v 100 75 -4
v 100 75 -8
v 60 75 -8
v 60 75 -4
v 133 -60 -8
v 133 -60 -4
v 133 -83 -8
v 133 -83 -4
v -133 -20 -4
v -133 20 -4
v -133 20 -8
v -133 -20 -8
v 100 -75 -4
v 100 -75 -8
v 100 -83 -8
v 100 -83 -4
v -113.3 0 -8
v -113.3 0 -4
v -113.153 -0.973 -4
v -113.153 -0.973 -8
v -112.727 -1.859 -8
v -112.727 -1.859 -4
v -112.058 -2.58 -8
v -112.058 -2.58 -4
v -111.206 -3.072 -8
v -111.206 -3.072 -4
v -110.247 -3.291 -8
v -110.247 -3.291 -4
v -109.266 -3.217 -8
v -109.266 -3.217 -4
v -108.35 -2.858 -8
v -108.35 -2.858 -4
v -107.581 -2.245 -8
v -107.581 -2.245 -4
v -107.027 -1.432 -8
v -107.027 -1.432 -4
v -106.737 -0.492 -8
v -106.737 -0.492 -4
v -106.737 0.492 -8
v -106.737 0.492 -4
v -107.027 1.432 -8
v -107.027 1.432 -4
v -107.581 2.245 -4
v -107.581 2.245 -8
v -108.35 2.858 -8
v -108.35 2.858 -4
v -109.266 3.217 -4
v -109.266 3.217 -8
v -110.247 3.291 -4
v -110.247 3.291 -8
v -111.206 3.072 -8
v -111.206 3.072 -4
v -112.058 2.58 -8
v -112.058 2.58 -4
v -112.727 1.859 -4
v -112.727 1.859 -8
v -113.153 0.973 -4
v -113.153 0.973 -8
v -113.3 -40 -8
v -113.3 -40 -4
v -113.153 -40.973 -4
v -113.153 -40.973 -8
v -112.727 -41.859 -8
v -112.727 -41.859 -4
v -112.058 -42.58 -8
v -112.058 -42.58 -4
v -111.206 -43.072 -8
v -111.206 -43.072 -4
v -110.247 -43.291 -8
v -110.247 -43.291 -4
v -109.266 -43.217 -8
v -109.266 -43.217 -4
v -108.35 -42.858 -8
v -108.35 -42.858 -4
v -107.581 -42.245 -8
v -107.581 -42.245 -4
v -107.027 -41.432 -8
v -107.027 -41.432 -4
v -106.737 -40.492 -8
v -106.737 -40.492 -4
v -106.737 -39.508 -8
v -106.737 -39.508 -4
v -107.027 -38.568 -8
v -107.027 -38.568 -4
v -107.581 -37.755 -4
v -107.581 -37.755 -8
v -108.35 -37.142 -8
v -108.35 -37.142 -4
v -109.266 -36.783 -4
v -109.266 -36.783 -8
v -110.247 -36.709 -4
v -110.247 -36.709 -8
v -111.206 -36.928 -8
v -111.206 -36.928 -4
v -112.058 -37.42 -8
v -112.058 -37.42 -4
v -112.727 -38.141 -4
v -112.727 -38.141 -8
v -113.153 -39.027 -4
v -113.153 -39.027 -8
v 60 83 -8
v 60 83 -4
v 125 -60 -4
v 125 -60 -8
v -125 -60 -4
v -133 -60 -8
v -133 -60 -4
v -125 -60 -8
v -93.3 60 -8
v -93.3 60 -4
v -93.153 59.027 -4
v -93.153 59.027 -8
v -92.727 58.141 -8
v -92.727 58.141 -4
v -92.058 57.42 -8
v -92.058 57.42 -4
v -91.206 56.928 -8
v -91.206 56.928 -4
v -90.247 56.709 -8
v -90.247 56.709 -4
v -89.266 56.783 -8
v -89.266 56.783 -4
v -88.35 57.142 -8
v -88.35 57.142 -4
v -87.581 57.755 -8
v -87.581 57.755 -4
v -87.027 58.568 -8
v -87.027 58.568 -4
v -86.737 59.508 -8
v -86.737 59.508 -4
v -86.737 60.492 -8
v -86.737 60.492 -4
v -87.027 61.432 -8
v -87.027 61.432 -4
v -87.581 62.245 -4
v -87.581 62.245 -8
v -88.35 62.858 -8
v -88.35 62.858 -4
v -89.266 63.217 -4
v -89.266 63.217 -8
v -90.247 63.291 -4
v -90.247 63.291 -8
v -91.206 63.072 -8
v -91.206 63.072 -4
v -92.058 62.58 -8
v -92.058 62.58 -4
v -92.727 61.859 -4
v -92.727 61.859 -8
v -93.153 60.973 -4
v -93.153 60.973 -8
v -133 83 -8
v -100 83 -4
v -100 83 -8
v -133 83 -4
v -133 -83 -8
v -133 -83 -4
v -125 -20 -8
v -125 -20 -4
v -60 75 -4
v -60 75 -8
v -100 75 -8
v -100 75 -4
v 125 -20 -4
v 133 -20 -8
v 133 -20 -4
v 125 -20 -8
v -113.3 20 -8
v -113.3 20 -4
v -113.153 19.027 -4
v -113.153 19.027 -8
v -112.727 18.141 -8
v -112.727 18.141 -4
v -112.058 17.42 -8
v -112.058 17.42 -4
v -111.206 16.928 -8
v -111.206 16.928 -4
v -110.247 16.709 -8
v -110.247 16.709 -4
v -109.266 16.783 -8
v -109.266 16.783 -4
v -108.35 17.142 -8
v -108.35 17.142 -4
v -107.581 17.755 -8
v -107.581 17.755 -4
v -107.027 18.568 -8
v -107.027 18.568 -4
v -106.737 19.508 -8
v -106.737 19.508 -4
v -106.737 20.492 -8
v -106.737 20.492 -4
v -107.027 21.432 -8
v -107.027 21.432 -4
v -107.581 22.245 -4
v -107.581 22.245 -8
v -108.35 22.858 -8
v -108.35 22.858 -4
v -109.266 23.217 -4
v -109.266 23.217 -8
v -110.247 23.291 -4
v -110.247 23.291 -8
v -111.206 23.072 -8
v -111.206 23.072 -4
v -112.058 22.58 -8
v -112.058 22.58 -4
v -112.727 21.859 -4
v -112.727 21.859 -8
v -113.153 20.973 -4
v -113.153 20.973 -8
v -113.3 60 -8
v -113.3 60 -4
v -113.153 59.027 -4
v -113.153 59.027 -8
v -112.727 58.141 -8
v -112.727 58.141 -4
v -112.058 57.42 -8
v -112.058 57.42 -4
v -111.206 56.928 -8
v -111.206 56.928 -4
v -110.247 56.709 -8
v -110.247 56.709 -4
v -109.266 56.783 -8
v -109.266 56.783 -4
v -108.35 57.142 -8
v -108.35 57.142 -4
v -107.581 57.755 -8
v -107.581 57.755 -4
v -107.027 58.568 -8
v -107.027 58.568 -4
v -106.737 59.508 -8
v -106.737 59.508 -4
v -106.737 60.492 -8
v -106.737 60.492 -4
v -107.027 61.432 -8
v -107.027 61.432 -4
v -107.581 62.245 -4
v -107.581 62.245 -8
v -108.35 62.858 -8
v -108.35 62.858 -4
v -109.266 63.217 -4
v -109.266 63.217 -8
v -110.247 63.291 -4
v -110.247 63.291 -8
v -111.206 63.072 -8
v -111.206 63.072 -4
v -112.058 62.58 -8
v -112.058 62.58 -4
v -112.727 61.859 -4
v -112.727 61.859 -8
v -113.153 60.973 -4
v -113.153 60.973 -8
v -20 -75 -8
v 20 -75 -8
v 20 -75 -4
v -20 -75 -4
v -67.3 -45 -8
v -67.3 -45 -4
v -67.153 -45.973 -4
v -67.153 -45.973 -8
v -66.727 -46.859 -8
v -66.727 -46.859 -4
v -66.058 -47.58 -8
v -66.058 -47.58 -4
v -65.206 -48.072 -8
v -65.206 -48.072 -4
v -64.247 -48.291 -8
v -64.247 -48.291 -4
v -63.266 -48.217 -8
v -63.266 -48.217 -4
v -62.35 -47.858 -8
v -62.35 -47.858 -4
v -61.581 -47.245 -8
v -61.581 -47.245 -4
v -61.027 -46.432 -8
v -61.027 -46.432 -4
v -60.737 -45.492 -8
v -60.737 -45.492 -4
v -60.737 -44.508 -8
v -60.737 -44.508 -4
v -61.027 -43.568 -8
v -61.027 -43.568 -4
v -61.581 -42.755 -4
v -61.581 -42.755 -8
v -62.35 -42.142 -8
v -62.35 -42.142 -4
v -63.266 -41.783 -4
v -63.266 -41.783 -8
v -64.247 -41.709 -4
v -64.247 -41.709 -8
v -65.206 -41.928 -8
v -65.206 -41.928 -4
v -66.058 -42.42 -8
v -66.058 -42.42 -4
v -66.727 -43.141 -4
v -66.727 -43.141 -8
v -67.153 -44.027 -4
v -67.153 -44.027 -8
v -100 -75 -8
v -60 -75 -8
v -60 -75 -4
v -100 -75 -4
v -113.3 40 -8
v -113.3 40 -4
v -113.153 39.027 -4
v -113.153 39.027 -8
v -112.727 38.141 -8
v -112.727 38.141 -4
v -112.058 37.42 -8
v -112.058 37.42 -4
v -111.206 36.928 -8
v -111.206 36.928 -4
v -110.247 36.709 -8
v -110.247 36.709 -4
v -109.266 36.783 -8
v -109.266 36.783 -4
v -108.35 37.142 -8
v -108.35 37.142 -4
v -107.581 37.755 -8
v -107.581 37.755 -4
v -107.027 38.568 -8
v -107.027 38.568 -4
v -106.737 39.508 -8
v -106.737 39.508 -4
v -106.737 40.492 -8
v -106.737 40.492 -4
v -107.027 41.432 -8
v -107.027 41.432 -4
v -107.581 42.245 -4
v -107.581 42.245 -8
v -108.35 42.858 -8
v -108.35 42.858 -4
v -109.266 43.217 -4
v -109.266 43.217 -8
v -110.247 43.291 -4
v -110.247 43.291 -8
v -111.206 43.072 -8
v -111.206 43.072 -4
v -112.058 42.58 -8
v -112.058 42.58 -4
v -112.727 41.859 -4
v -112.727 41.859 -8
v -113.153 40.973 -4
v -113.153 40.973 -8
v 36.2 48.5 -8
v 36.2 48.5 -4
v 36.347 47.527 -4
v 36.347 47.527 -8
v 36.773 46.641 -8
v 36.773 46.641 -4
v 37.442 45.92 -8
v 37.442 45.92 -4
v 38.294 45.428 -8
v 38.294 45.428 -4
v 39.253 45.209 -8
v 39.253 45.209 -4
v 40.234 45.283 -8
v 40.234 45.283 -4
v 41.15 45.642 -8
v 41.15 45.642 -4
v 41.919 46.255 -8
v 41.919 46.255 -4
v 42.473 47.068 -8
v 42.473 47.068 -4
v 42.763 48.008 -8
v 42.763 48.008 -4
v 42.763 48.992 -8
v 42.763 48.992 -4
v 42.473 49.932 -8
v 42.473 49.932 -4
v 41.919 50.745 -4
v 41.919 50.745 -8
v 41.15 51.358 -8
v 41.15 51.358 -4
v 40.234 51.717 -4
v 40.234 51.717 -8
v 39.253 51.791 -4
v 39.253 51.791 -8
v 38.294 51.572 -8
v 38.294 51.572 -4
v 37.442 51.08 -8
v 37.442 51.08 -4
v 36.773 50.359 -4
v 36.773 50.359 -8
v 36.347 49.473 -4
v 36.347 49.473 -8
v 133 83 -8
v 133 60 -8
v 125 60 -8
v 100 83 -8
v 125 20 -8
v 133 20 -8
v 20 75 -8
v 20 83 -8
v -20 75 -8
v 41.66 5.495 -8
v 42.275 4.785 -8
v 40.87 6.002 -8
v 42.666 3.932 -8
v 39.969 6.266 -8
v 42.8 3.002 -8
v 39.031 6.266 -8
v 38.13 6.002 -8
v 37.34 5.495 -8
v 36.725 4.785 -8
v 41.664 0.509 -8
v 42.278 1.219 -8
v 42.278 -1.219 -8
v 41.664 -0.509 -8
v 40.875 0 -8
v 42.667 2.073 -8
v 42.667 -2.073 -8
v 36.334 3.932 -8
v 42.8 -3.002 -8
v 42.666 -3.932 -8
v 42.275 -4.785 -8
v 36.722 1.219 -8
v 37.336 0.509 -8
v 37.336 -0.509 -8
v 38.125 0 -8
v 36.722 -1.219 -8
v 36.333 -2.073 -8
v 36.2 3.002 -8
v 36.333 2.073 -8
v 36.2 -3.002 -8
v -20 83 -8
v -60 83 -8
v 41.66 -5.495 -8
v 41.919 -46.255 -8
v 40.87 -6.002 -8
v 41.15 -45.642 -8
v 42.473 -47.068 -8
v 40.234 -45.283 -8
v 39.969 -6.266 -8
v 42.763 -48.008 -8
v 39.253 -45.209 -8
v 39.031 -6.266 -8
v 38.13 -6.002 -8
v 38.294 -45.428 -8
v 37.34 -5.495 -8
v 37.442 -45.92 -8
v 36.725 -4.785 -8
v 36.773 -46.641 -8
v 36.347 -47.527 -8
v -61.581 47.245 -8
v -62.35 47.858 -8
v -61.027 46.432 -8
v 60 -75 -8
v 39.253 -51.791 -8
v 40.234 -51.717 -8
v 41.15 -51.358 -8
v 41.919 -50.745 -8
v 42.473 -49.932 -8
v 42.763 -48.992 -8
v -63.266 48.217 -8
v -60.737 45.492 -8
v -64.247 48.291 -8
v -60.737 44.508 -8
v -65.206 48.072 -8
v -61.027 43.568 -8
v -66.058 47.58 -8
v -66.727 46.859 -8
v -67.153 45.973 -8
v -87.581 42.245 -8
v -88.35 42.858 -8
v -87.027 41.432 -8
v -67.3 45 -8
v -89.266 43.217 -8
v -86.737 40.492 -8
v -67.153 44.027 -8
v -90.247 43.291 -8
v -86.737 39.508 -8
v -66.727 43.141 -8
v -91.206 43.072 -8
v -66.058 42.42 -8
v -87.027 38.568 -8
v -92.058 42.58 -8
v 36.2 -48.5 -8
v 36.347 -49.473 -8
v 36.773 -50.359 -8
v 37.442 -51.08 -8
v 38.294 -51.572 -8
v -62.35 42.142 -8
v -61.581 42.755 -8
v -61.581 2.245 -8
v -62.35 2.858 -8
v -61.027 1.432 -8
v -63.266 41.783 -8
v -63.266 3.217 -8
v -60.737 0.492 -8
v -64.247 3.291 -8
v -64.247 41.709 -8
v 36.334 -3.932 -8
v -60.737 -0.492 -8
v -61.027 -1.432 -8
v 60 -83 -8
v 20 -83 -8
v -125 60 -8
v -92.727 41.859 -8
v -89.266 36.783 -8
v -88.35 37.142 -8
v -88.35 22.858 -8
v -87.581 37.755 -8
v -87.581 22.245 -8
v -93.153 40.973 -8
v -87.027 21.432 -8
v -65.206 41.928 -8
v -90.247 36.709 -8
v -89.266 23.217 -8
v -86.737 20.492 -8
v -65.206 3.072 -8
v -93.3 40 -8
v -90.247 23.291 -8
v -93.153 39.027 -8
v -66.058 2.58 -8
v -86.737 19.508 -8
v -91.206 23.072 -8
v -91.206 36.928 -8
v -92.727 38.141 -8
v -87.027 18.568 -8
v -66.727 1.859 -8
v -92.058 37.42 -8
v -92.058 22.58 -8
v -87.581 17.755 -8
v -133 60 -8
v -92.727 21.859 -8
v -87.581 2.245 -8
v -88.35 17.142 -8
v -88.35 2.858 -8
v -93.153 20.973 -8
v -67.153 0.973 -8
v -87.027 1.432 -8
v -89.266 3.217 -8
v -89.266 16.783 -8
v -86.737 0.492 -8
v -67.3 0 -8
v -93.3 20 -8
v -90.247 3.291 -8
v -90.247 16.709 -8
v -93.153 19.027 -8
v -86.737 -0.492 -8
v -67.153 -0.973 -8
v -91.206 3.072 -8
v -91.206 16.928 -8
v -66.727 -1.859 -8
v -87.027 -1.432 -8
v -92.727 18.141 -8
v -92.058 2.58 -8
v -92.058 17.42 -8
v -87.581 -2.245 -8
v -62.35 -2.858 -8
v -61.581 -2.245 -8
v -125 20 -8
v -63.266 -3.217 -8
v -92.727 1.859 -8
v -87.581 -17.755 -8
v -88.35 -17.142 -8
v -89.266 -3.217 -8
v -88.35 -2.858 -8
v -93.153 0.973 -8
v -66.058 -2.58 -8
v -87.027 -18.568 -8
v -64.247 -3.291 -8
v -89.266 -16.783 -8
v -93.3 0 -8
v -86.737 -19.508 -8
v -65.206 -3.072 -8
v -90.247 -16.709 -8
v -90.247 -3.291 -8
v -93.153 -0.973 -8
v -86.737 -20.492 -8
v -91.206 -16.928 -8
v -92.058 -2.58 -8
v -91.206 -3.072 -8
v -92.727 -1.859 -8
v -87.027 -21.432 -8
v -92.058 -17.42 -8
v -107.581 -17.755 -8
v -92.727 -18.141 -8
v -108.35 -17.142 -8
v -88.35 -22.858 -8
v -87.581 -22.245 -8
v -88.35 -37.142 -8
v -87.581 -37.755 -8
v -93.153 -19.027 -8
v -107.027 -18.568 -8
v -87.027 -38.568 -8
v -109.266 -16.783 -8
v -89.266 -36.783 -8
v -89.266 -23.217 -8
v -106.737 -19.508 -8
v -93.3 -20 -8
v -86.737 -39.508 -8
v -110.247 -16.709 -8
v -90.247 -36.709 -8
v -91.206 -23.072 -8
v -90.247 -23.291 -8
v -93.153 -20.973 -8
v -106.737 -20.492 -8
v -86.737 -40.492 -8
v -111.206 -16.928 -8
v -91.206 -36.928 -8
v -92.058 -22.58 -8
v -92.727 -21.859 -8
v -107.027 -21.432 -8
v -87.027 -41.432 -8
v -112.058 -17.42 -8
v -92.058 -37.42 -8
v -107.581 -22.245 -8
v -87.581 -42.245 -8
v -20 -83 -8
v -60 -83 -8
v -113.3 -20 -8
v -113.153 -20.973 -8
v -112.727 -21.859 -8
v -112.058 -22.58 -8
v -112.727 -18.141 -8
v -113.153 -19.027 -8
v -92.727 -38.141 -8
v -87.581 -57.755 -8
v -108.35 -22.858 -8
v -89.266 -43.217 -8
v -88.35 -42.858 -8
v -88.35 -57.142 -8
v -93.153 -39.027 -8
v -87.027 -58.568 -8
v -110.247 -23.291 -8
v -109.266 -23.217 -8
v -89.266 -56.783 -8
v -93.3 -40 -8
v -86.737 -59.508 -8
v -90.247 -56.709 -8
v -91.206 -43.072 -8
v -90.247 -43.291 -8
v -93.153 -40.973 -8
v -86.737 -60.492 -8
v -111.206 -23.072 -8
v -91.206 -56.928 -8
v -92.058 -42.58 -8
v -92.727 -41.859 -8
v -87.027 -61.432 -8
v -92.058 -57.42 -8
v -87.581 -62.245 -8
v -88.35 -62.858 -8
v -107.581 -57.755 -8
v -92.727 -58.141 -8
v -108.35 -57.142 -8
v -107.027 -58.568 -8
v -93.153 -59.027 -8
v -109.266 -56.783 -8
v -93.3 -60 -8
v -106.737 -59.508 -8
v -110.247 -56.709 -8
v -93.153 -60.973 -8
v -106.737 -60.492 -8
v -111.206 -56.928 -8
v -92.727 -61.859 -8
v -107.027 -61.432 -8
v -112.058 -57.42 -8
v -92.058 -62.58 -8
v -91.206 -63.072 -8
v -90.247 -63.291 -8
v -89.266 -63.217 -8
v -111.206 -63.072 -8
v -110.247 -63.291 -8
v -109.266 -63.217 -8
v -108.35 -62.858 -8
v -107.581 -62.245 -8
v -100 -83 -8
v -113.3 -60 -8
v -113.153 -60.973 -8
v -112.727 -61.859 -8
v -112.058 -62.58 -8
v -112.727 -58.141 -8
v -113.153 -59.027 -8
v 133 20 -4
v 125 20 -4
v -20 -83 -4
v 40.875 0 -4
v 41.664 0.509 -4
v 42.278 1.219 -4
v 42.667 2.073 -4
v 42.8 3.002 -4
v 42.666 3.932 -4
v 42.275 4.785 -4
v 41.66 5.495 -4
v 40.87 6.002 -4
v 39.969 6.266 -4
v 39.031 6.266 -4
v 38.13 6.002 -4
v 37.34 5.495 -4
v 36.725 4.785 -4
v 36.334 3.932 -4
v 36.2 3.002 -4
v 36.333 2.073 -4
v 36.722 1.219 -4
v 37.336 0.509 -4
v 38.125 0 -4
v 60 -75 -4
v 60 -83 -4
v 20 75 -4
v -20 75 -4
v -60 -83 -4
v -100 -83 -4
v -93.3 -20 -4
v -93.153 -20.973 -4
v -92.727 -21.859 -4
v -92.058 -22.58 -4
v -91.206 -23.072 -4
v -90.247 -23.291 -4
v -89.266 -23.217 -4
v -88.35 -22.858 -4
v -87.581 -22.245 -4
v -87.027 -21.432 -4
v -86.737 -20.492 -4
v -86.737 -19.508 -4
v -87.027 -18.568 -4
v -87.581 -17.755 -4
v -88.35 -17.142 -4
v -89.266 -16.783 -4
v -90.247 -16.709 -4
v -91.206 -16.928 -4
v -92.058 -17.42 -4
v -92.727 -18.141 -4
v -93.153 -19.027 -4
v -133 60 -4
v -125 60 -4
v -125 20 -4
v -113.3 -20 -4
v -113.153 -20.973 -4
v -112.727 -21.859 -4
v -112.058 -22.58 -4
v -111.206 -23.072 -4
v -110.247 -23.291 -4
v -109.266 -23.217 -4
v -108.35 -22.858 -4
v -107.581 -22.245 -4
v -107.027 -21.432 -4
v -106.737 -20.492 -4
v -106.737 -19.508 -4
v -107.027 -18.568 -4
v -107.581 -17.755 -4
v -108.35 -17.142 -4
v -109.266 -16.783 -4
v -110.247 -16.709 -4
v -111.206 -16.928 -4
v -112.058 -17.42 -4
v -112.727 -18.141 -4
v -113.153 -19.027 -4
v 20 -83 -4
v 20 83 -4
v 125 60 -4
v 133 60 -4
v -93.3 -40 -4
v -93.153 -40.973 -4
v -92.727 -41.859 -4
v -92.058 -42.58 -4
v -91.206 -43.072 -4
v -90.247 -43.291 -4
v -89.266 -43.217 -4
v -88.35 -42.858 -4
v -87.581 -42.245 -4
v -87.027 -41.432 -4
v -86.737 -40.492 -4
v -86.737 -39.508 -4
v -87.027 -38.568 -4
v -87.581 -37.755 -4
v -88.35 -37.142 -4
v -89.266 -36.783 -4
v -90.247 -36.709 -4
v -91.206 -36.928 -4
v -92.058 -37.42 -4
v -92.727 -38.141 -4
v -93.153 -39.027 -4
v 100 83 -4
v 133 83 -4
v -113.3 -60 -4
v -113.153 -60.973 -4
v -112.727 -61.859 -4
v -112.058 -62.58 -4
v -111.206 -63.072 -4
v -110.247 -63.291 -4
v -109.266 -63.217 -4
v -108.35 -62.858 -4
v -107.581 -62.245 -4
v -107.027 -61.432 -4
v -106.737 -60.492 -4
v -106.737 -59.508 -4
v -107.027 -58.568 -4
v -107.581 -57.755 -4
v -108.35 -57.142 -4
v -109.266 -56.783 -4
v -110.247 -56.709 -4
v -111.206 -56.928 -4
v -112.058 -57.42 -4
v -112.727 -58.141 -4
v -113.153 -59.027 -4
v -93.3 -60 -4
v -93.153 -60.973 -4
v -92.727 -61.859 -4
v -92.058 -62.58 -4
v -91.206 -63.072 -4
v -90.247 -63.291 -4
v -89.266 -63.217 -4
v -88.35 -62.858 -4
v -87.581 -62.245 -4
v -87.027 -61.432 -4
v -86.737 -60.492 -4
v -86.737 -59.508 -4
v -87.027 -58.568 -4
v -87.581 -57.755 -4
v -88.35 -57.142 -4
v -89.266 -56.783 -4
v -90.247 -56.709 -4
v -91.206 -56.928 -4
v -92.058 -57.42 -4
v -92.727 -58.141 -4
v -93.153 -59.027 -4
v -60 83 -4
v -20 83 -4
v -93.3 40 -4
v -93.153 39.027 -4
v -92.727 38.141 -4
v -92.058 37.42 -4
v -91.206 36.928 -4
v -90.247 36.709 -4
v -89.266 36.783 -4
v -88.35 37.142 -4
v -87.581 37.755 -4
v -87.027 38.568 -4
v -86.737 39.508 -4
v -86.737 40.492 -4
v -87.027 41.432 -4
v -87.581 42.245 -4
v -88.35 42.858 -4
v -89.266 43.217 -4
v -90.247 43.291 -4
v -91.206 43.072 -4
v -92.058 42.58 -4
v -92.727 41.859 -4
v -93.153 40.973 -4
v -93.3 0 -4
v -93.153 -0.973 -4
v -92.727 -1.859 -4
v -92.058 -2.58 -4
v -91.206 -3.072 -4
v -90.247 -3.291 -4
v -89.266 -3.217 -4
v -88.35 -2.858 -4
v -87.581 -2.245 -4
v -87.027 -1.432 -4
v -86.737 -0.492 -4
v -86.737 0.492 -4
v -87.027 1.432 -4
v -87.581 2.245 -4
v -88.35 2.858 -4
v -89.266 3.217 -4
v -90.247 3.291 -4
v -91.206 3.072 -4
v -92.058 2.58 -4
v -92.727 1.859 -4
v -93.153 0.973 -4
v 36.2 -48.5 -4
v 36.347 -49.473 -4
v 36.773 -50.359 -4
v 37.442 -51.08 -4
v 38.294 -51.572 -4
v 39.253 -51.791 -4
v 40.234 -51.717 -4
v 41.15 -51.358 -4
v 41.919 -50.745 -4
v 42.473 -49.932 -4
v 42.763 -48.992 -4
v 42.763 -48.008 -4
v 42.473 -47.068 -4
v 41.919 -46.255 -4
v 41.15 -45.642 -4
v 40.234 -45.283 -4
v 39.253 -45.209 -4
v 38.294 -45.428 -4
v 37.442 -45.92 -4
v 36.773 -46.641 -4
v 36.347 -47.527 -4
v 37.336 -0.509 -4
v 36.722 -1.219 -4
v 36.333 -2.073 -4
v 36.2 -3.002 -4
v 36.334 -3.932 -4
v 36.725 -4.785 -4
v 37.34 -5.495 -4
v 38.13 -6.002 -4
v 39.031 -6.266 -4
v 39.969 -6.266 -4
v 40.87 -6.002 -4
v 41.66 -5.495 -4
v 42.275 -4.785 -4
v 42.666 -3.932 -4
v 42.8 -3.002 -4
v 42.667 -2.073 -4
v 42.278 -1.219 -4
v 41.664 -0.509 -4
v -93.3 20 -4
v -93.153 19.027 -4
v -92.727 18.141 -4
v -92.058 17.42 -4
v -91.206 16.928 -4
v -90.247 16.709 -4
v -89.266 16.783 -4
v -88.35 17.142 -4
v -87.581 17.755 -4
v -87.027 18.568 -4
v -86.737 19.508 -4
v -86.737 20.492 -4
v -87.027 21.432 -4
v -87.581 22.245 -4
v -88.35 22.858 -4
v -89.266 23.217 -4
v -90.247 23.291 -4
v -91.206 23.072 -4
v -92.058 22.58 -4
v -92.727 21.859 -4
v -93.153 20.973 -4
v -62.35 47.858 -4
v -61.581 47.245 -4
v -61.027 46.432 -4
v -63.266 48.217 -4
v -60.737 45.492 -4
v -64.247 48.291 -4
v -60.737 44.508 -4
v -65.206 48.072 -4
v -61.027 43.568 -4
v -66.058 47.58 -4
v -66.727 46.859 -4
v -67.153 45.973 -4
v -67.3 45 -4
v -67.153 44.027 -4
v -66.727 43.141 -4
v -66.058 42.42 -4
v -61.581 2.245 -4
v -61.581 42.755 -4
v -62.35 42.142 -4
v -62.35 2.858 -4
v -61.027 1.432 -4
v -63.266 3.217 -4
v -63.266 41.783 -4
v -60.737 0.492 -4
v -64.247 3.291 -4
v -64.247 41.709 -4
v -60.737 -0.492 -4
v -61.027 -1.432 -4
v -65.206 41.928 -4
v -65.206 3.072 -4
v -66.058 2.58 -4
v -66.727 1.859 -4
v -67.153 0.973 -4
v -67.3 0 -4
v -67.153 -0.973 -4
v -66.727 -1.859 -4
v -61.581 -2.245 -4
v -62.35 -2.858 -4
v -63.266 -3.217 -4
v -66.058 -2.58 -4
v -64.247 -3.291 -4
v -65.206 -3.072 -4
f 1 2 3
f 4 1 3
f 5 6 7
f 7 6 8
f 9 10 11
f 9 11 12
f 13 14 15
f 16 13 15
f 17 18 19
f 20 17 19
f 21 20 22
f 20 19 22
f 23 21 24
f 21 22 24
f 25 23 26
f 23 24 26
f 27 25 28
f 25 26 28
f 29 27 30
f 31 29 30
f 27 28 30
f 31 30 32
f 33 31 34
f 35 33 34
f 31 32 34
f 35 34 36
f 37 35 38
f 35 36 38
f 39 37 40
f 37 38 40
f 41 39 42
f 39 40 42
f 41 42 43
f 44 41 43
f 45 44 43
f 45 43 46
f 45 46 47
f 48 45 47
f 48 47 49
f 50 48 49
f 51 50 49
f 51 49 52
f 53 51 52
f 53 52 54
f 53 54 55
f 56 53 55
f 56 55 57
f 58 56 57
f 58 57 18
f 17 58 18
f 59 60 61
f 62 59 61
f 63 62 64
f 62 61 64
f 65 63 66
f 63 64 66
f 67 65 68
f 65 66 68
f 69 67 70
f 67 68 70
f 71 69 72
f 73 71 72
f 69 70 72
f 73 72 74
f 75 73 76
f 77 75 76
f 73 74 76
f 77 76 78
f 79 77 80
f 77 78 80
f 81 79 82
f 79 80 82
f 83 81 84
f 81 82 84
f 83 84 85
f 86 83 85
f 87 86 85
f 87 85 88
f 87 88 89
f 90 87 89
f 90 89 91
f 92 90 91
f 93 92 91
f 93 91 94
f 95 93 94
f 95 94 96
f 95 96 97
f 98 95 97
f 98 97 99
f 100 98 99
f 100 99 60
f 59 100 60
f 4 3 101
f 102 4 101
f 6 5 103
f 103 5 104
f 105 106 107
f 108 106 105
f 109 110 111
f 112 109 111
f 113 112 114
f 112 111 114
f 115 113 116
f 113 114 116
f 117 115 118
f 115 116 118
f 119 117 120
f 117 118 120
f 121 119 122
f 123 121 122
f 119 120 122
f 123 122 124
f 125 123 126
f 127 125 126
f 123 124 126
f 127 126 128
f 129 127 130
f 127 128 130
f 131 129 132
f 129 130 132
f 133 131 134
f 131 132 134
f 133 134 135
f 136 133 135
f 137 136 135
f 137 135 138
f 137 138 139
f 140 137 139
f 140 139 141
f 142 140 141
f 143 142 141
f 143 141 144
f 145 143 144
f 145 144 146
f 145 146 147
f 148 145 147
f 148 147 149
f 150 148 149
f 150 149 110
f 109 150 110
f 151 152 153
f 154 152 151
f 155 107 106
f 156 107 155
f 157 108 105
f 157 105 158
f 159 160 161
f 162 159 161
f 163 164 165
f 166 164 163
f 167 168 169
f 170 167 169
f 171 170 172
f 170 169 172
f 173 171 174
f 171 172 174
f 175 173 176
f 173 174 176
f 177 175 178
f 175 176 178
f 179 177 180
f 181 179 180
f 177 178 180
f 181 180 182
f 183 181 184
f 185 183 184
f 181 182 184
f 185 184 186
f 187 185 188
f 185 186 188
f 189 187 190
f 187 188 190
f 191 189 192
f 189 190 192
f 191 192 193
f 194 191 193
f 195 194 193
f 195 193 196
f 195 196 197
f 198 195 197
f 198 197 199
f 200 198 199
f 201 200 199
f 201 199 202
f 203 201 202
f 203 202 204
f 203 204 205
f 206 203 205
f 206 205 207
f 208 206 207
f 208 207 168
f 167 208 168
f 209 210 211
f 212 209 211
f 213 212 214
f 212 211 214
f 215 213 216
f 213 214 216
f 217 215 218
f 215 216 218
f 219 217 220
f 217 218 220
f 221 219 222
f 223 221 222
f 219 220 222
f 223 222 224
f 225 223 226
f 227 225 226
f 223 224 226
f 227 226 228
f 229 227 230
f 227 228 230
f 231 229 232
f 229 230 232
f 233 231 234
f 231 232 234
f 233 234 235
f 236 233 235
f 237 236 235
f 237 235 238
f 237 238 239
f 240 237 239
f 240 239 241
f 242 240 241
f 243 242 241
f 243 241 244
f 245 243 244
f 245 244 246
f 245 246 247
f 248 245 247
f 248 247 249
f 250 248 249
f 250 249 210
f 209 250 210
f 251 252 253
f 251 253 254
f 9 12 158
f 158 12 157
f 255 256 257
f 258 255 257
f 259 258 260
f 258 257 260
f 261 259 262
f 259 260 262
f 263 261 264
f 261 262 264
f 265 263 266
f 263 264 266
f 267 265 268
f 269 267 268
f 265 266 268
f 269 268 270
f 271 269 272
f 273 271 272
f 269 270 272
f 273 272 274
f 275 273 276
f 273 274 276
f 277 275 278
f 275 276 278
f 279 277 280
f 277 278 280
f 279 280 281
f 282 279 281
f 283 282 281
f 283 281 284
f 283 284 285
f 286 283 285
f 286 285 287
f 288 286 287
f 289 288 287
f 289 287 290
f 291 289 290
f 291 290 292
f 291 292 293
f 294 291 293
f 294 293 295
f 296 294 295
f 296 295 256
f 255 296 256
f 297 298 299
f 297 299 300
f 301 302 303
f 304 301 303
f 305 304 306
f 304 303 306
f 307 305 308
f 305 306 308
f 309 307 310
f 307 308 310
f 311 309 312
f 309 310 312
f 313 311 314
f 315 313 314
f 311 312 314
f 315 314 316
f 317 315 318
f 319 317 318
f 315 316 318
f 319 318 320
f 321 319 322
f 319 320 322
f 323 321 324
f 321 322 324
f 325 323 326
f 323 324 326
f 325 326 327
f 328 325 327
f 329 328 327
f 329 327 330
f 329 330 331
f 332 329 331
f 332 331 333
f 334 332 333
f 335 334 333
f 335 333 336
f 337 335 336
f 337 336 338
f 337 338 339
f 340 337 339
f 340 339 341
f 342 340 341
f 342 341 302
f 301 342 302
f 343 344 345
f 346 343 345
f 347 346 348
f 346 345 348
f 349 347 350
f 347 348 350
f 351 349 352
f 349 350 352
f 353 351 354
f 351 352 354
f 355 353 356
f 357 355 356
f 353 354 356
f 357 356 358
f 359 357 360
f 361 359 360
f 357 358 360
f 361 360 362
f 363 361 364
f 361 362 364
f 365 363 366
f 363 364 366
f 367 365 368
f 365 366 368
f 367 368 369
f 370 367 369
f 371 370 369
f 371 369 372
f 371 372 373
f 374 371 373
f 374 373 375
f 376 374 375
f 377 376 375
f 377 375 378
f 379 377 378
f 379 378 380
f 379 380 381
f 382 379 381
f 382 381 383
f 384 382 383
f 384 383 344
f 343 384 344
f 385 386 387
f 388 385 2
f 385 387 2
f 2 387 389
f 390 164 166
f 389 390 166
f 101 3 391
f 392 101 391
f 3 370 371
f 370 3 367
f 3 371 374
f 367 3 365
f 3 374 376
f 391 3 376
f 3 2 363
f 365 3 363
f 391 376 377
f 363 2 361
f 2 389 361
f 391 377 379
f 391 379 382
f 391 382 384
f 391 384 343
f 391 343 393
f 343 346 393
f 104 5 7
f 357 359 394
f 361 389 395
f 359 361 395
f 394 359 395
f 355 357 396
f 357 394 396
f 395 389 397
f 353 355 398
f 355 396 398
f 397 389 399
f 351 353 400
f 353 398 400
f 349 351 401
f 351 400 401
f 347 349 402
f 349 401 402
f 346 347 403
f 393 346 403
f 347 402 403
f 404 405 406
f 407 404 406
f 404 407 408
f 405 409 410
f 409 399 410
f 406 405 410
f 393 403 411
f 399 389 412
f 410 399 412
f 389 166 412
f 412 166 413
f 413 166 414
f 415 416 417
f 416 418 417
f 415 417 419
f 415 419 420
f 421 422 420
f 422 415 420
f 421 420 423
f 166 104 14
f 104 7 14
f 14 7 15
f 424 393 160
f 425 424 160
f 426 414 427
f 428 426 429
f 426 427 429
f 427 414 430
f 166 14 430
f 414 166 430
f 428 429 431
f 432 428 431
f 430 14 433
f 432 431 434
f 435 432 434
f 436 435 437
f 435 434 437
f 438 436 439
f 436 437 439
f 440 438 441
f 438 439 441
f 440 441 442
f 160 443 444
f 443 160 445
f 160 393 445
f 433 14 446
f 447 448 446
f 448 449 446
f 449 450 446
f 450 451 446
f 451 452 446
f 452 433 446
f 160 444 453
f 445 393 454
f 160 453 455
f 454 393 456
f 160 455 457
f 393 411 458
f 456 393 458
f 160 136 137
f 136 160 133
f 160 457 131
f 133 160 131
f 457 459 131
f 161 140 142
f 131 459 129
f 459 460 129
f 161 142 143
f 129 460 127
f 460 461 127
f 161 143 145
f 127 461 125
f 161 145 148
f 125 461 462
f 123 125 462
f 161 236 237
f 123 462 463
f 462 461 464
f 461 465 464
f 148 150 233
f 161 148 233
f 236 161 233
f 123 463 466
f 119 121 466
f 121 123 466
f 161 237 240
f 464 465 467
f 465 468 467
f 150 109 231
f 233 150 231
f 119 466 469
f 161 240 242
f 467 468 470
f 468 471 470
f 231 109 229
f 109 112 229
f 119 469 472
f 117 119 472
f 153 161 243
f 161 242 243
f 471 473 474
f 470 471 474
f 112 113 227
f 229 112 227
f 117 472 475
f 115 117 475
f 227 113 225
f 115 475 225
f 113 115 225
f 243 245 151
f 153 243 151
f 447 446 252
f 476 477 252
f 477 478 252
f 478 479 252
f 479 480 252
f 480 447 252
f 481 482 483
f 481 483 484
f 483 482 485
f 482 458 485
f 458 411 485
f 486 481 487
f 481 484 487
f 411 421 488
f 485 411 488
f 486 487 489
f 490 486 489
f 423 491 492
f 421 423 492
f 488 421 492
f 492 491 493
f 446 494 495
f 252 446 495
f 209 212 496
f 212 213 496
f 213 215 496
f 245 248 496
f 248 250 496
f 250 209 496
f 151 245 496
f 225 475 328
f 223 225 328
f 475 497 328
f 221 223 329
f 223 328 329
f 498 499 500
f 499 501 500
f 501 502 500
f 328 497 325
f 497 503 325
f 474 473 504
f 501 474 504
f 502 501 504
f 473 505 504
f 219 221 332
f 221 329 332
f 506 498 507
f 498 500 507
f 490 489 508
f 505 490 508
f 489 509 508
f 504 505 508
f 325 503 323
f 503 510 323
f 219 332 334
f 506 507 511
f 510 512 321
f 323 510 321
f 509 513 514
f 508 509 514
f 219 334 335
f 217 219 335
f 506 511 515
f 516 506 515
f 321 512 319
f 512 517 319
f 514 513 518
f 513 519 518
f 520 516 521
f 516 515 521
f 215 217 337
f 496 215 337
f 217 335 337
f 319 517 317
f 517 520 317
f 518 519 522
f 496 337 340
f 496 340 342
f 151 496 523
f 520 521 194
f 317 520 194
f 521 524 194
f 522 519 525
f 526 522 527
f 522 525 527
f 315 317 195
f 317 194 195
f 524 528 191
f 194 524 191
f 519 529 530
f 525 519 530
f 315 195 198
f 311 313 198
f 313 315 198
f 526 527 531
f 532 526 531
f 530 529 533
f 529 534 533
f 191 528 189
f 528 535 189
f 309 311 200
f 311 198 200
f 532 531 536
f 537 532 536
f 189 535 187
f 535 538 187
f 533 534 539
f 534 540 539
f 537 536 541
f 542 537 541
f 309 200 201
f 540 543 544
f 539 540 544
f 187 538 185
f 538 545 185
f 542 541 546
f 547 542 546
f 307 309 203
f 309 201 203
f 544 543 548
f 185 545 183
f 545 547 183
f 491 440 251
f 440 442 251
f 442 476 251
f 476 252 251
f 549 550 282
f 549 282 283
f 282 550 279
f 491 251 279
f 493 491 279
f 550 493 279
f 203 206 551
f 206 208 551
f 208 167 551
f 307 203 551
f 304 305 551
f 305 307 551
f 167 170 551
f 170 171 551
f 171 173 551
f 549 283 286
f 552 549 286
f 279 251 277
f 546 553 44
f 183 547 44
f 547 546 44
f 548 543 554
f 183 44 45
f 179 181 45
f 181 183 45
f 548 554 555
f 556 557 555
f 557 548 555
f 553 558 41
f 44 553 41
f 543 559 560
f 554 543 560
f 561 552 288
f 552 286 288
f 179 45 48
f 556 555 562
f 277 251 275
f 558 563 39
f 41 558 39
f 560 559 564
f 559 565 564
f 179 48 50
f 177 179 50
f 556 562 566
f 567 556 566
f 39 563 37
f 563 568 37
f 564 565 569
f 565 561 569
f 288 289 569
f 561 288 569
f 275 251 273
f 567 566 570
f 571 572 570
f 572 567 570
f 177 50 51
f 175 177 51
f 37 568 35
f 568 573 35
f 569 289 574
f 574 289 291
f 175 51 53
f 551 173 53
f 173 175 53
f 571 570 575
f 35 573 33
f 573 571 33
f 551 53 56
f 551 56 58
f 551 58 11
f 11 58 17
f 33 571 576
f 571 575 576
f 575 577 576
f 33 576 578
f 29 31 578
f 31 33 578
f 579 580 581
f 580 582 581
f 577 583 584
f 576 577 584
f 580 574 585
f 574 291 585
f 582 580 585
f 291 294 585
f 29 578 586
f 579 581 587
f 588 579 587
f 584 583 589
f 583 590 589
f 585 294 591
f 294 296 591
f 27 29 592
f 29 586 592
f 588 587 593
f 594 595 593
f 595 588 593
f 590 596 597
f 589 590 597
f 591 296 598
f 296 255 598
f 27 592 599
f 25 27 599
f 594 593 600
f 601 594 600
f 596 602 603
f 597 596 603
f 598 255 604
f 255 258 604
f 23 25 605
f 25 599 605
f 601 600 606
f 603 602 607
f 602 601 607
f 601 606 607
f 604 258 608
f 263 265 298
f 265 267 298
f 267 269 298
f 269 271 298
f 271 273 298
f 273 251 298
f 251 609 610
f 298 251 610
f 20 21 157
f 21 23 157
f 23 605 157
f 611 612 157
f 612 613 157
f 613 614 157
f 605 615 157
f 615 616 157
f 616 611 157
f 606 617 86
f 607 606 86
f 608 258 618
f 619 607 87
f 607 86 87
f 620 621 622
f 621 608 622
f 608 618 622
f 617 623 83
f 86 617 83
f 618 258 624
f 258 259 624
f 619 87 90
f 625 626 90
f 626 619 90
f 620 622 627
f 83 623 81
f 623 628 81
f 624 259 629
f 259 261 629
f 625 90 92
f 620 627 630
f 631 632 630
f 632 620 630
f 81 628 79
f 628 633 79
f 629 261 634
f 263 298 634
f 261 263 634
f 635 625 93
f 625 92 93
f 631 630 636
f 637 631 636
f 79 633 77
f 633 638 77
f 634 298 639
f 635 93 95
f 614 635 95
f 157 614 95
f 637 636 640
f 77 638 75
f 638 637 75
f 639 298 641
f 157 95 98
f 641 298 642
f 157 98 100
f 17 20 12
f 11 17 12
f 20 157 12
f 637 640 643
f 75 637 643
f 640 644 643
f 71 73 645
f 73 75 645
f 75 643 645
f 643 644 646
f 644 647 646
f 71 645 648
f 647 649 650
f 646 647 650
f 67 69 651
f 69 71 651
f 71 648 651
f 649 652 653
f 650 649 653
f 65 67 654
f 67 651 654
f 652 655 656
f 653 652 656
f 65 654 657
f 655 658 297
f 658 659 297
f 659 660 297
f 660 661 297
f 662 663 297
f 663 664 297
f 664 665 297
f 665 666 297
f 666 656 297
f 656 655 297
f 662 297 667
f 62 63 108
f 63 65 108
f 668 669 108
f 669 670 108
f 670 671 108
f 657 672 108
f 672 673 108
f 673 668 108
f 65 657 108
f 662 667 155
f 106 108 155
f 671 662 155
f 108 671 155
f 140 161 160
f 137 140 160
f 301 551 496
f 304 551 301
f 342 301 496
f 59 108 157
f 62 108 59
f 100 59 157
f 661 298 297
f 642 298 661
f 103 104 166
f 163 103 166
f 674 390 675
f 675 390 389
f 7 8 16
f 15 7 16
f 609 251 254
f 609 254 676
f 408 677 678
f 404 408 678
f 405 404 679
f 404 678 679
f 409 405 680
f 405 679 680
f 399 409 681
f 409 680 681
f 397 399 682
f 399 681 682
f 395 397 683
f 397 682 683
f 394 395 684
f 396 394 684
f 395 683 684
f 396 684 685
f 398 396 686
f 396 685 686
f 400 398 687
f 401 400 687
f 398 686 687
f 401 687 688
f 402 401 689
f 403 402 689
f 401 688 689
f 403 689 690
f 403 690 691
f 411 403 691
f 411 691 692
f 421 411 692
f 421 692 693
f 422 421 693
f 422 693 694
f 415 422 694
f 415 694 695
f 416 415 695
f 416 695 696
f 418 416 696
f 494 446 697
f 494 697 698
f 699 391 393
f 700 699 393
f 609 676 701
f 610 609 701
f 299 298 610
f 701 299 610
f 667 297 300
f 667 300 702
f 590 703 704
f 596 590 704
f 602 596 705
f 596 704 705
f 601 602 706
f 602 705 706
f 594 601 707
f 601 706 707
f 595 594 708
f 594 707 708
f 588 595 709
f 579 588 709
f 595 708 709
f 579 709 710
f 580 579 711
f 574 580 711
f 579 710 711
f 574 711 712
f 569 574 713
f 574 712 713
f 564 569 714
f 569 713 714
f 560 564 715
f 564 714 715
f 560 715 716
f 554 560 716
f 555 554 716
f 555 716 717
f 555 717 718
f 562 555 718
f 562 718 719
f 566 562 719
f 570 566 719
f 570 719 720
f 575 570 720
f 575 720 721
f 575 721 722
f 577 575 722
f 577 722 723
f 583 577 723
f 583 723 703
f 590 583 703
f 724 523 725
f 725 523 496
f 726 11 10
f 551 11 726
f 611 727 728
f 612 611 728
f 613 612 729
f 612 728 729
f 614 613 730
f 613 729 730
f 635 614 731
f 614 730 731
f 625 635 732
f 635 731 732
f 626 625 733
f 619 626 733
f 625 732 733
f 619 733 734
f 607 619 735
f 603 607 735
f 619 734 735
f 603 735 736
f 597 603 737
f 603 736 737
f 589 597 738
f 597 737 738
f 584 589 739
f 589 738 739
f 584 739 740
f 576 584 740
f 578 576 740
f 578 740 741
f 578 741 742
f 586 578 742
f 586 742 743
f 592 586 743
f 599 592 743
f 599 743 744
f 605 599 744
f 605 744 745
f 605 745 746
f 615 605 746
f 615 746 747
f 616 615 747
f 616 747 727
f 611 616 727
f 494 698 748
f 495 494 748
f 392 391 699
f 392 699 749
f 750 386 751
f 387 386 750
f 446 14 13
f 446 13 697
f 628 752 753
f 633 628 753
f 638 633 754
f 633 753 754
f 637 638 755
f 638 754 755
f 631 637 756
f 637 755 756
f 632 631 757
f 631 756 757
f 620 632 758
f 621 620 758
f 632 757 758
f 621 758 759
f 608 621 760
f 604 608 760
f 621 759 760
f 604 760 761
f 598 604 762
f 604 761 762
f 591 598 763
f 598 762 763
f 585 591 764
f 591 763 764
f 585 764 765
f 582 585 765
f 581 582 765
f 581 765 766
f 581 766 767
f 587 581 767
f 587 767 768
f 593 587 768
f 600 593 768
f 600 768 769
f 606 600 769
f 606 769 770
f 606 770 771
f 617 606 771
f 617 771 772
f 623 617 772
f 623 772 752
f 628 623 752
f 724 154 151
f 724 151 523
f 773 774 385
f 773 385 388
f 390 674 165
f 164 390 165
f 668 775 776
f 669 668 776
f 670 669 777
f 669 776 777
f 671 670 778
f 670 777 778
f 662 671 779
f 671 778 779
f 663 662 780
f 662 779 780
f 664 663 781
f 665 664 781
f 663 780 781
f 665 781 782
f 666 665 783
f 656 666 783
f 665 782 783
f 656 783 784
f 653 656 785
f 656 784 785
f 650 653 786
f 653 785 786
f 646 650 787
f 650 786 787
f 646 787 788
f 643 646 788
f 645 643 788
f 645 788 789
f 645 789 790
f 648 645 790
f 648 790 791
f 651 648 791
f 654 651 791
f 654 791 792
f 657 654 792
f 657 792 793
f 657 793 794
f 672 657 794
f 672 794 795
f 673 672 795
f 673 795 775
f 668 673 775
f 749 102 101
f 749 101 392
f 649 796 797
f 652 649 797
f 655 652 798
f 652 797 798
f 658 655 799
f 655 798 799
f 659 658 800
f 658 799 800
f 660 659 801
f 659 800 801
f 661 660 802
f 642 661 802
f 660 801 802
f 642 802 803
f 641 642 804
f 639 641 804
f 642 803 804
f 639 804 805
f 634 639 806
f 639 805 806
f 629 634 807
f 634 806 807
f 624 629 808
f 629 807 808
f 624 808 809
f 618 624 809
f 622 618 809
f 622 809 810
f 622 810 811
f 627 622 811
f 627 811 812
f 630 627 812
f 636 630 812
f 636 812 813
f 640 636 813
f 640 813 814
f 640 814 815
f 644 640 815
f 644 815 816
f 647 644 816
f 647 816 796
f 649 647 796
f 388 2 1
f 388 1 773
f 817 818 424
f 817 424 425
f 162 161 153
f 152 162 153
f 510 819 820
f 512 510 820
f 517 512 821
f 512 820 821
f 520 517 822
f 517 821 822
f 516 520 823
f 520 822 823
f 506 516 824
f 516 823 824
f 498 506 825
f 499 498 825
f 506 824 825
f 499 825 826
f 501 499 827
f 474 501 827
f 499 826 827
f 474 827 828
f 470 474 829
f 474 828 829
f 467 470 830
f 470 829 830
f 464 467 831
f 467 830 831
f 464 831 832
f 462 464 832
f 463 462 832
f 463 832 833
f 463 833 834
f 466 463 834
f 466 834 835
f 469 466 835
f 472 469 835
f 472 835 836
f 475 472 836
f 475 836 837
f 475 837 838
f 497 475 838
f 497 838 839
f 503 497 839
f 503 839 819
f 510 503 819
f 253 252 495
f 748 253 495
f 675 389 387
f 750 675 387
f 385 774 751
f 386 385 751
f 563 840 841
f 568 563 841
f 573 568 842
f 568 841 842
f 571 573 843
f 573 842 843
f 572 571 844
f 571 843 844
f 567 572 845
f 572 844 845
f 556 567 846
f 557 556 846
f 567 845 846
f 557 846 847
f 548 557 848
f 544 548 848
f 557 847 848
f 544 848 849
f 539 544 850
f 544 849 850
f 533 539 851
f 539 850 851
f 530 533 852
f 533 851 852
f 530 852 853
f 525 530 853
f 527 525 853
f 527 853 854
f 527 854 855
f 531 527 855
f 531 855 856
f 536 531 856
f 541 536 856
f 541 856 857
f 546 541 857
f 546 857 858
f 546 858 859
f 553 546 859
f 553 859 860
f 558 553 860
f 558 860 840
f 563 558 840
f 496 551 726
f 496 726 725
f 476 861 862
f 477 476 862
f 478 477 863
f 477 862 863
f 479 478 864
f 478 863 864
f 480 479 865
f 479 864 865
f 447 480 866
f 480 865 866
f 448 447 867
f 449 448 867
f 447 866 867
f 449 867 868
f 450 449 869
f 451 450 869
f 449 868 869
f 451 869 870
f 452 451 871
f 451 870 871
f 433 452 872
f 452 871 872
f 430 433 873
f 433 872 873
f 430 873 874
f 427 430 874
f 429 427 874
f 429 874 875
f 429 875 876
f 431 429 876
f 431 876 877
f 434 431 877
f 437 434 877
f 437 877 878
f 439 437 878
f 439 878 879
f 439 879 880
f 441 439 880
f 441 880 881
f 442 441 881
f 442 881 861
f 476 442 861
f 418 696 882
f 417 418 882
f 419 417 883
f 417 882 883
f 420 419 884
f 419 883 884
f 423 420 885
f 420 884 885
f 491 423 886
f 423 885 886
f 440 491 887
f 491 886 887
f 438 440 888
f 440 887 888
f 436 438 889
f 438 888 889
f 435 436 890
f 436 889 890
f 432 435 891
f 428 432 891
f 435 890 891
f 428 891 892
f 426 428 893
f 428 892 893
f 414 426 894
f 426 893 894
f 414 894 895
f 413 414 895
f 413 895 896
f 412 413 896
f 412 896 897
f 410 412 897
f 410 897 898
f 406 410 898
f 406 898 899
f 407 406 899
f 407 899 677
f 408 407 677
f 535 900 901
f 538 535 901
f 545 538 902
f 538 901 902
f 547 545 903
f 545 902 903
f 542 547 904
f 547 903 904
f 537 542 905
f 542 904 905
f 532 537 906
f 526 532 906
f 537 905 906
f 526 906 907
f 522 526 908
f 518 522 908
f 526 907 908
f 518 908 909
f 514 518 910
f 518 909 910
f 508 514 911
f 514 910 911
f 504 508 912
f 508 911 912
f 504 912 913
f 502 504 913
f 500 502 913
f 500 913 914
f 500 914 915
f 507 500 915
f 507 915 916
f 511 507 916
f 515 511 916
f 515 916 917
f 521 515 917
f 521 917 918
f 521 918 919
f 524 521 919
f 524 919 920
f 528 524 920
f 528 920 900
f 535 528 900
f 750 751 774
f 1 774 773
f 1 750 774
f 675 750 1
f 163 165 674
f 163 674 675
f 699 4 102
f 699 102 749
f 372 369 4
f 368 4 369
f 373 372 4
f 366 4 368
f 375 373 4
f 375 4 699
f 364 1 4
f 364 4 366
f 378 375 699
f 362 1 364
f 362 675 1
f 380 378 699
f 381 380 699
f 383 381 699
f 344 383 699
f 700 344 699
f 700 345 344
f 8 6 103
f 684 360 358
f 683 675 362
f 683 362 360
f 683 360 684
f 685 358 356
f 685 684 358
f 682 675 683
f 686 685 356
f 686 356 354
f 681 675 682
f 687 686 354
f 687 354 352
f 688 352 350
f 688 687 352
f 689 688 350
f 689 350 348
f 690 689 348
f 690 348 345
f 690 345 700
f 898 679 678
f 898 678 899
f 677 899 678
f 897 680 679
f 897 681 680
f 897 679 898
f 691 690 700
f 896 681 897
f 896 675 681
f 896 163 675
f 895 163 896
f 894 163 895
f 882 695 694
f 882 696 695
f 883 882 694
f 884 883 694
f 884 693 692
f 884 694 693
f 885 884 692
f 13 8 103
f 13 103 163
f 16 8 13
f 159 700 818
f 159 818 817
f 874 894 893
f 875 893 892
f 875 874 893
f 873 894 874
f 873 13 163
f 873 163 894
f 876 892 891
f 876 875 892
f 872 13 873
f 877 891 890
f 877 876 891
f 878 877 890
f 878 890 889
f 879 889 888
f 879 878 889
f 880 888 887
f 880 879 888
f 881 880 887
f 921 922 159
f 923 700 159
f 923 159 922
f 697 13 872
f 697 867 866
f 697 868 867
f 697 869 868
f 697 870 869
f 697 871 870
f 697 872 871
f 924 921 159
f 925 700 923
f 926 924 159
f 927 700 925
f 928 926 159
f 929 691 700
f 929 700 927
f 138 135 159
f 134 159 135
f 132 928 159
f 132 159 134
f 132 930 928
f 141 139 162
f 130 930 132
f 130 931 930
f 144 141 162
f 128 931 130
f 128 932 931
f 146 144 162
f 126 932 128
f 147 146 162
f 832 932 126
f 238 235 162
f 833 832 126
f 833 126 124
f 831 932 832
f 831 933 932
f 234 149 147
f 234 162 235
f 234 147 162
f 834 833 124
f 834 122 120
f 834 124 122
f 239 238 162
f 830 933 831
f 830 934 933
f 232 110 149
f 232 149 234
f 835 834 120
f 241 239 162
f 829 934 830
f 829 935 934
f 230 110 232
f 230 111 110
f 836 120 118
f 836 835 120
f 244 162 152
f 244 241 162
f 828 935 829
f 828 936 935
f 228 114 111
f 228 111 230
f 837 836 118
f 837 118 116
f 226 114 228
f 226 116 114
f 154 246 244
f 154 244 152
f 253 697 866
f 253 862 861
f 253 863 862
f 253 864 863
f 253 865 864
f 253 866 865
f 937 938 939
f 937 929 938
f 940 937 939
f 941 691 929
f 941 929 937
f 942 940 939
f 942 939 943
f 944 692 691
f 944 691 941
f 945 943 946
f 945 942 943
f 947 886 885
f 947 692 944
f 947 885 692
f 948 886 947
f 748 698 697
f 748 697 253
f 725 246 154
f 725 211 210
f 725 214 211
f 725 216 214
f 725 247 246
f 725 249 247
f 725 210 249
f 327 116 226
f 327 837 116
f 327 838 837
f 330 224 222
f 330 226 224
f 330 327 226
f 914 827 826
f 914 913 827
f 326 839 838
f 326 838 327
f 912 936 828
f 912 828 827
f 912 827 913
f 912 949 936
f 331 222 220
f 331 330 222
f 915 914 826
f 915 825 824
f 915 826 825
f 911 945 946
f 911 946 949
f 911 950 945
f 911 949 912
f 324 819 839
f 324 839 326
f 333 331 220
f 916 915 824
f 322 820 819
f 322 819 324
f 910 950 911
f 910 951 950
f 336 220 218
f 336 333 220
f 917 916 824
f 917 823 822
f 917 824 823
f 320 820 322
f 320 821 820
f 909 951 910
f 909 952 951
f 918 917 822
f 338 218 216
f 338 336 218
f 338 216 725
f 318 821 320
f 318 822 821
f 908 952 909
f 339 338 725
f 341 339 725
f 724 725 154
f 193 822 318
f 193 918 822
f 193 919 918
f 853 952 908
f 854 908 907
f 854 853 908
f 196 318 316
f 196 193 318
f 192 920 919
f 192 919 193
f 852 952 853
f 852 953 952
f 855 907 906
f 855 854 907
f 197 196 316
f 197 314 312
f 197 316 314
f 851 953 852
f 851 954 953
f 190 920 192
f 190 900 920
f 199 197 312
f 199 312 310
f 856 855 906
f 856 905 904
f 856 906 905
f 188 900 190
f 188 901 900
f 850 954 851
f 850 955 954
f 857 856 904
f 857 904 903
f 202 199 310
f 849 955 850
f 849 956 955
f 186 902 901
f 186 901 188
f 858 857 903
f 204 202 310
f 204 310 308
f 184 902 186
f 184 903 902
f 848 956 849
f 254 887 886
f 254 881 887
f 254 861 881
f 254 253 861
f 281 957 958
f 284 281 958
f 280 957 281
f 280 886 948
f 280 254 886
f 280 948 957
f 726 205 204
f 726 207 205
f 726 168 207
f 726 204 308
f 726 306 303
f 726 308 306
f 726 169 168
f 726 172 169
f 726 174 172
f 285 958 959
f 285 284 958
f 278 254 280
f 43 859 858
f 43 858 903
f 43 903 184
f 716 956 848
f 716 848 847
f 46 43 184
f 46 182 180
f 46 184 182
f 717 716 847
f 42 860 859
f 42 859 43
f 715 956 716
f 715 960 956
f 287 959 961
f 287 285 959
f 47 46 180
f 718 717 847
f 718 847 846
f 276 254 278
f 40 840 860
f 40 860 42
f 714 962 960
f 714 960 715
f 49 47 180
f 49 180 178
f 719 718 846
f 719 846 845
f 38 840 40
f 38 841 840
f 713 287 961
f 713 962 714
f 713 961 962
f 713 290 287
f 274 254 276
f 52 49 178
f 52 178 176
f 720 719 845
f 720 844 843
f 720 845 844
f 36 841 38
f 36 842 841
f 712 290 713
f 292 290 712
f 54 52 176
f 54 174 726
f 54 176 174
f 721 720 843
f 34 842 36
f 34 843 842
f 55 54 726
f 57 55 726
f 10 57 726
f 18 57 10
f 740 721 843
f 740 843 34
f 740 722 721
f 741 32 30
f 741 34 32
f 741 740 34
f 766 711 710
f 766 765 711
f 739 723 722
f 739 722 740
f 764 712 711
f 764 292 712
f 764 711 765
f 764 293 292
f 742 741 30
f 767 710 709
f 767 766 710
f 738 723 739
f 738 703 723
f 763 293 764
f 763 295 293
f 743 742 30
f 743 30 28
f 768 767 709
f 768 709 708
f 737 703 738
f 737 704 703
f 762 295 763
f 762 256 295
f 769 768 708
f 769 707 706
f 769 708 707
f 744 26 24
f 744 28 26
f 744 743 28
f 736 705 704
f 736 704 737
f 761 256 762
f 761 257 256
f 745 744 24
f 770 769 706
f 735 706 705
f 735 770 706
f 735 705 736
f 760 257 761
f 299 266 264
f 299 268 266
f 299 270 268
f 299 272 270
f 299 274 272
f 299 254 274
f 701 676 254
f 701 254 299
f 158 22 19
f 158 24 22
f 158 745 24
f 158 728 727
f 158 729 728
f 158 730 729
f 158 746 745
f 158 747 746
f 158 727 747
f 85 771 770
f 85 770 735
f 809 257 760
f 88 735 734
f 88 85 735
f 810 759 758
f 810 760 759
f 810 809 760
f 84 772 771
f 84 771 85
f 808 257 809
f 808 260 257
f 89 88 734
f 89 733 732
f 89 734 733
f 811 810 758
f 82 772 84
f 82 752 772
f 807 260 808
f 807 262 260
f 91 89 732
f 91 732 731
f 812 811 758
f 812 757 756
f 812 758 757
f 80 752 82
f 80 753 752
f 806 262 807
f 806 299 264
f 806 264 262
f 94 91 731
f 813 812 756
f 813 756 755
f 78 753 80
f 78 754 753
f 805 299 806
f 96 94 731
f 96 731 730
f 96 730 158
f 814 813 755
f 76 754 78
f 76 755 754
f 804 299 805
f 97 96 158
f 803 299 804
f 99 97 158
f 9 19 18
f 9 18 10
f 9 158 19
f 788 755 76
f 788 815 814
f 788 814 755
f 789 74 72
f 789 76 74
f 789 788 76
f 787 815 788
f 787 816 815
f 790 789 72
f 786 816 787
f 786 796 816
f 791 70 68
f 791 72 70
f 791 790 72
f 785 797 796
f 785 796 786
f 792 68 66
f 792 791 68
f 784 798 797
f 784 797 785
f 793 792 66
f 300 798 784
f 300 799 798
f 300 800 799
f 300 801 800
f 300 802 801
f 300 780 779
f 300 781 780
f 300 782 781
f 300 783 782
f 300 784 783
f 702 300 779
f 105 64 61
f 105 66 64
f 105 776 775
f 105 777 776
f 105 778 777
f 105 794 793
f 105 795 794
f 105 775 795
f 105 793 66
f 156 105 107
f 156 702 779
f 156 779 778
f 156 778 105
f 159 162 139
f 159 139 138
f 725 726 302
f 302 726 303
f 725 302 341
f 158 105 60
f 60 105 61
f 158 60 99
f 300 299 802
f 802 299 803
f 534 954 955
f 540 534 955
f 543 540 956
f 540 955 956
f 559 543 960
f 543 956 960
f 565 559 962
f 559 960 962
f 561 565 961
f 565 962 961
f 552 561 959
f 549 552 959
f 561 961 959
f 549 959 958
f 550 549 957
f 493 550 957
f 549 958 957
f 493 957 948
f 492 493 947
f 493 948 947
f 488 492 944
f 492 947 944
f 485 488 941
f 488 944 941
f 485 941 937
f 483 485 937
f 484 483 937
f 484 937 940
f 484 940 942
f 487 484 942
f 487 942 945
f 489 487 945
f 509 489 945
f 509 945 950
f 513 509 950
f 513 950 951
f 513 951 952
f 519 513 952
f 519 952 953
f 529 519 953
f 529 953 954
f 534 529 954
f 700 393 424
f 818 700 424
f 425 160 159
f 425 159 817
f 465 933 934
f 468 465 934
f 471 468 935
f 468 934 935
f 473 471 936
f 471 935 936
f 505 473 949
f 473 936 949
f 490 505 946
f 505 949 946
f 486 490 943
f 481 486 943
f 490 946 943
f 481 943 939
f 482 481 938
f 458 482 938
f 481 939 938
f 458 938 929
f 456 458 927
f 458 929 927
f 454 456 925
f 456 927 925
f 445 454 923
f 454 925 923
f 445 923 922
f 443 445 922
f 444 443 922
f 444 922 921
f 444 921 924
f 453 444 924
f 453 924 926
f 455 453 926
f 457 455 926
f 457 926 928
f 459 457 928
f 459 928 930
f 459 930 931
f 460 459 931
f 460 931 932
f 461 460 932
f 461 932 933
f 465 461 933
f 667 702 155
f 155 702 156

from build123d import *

# Parameters (mm, degrees)
SKETCH002_W   = 266
SKETCH002_H   = 166
PAD001_DEPTH  = 4
SKETCH015_W   = 40
SKETCH015_H   = 30
SKETCH015_W_2 = 30
SKETCH015_H_2 = 40
POCKET_DEPTH  = 631.146916
SKETCH034_R   = 3.3
HOLE_DEPTH    = 4.001


with BuildPart() as part:
    # Sketch002 (on DatumPlane) → Pad001 (new body)
    with BuildSketch(Plane(origin=(0, 0, -4), x_dir=(-1, 0, 0), z_dir=(0, 0, 1))):
        Rectangle(SKETCH002_W, SKETCH002_H)
    extrude(amount=-PAD001_DEPTH)

    # Sketch015 (on Face6 of Pad001) → Pocket (cut, through all)
    with BuildSketch(Plane(origin=(0, 0, -8), x_dir=(-1, 0, 0), z_dir=(0, 0, -1))):
        with Locations((-80, 90)):
            Rectangle(SKETCH015_W, SKETCH015_H)
        with Locations((0, 90)):
            Rectangle(SKETCH015_W, SKETCH015_H)
        with Locations((80, 90)):
            Rectangle(SKETCH015_W, SKETCH015_H)
        with Locations((-140, 40)):
            Rectangle(SKETCH015_W_2, SKETCH015_H_2)
        with Locations((-140, -40)):
            Rectangle(SKETCH015_W_2, SKETCH015_H_2)
    pocket = extrude(amount=-POCKET_DEPTH, mode=Mode.SUBTRACT)

    # Mirrored: Pocket across Sketch015 V_Axis
    add(pocket.mirror(Plane(origin=(0, 0, -8), x_dir=(0, 0, -1), z_dir=(-1, 0, 0))), mode=Mode.SUBTRACT)

    # Mirrored001: Pocket across Sketch015 H_Axis
    add(pocket.mirror(Plane(origin=(0, 0, -8), x_dir=(0, 0, -1), z_dir=(0, 1, 0))), mode=Mode.SUBTRACT)

    # Sketch034 (on Face2 of Mirrored001) → Hole (cut, through all)
    with BuildSketch(Plane(origin=(0, 0, -4), x_dir=(-1, 0, 0), z_dir=(0, 0, 1))):
        with Locations((-39.5, 48.5)):
            Circle(SKETCH034_R)
        with Locations((64, 45)):
            Circle(SKETCH034_R)
        with Locations((64, 0)):
            Circle(SKETCH034_R)
        with Locations((-39.5, 3)):
            Circle(SKETCH034_R)
        with Locations((-39.5, -3)):
            Circle(SKETCH034_R)
        with Locations((-39.5, -48.5)):
            Circle(SKETCH034_R)
        with Locations((64, -45)):
            Circle(SKETCH034_R)
        with Locations((110, 60)):
            Circle(SKETCH034_R)
        with Locations((90, 60)):
            Circle(SKETCH034_R)
        with Locations((110, 40)):
            Circle(SKETCH034_R)
        with Locations((90, 40)):
            Circle(SKETCH034_R)
        with Locations((110, 20)):
            Circle(SKETCH034_R)
        with Locations((90, 20)):
            Circle(SKETCH034_R)
        with Locations((110, 0)):
            Circle(SKETCH034_R)
        with Locations((90, 0)):
            Circle(SKETCH034_R)
        with Locations((110, -20)):
            Circle(SKETCH034_R)
        with Locations((90, -20)):
            Circle(SKETCH034_R)
        with Locations((110, -40)):
            Circle(SKETCH034_R)
        with Locations((90, -40)):
            Circle(SKETCH034_R)
        with Locations((110, -60)):
            Circle(SKETCH034_R)
        with Locations((90, -60)):
            Circle(SKETCH034_R)
    extrude(amount=-HOLE_DEPTH, mode=Mode.SUBTRACT)


solid = part.part
